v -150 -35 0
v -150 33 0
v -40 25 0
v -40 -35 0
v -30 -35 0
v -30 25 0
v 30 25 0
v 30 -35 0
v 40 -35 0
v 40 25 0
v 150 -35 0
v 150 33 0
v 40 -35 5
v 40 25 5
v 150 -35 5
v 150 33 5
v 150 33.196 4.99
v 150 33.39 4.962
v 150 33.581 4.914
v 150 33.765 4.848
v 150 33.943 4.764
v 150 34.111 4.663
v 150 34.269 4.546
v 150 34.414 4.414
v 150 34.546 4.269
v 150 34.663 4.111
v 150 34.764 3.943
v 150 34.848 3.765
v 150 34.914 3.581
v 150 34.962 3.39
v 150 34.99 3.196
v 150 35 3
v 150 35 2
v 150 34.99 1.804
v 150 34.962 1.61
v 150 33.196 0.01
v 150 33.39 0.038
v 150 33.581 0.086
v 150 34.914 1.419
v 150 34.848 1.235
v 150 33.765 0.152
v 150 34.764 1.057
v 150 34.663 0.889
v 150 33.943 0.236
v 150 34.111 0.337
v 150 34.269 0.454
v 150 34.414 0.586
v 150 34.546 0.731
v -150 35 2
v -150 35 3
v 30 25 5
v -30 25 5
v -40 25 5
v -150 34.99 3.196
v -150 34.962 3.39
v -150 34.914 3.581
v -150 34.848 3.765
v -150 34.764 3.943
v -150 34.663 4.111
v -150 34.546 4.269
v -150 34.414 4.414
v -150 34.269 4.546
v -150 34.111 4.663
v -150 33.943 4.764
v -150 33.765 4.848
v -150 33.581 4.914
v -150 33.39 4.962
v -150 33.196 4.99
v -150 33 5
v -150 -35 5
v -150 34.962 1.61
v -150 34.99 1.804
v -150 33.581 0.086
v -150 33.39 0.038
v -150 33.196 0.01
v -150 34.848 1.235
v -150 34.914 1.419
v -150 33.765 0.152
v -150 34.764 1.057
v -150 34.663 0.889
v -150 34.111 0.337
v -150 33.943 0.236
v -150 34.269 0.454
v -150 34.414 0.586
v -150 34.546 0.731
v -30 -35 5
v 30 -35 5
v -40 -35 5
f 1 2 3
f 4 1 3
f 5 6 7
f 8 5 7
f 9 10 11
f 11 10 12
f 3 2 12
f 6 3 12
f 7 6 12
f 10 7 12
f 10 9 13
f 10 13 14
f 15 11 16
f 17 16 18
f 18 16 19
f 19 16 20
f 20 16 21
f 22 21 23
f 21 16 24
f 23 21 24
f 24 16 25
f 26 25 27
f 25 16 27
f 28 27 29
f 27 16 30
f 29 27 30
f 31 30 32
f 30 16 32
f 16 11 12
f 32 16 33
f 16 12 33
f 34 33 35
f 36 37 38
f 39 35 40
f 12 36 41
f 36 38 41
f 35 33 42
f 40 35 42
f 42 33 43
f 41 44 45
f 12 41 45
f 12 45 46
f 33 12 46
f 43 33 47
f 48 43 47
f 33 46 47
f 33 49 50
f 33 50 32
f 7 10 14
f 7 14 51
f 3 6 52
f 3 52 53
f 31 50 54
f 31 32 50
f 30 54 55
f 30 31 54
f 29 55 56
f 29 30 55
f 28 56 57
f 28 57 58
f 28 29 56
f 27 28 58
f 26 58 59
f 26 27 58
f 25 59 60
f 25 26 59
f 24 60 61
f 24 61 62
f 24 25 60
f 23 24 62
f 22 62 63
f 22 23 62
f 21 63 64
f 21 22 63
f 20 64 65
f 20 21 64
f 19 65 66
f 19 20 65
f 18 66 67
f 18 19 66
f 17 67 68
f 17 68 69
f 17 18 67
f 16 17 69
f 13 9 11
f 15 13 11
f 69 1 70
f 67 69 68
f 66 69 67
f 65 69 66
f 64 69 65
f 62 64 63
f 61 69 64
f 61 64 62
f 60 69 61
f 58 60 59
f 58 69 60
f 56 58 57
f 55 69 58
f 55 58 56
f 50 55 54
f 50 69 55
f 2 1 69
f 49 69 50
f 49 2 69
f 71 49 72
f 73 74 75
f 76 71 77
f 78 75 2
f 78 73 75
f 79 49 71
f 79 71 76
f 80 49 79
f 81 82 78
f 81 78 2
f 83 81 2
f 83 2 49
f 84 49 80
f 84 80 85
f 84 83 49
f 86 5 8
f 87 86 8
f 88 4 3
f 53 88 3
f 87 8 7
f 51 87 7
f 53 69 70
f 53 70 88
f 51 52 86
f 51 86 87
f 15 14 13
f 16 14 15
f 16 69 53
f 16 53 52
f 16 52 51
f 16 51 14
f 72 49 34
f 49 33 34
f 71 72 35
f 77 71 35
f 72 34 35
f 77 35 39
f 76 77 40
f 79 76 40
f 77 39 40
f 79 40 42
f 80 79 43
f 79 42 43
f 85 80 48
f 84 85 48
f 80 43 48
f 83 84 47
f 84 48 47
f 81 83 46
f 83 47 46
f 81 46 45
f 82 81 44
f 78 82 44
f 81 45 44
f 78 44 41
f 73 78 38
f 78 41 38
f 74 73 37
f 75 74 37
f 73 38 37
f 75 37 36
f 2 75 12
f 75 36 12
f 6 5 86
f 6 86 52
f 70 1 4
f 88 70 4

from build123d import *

# Parameters (mm, degrees)
ESQUISSE1_W             = 300
ESQUISSE1_H             = 70
BOSS_EXTRU_1_DEPTH      = 5
CONG_2_R                = 2
CONG_3_R                = 2
ESQUISSE2_W             = 10
ESQUISSE2_H             = 60
ENL_V_MAT_EXTRU_1_DEPTH = 155.110350074


with BuildPart() as part:
    # Esquisse1 → Boss.-Extru.1 (new body)
    with BuildSketch(Plane.XY):
        Rectangle(ESQUISSE1_W, ESQUISSE1_H)
    extrude(amount=BOSS_EXTRU_1_DEPTH)

    # Congé2
    cong_2_edges = [part.edges().sort_by_distance(p)[0] for p in [
        (0, 35, 0),
    ]]
    fillet(cong_2_edges, radius=CONG_2_R)

    # Congé3
    cong_3_edges = [part.edges().sort_by_distance(p)[0] for p in [
        (0, 35, 5),
    ]]
    fillet(cong_3_edges, radius=CONG_3_R)

    # Esquisse2 → Enlèv. mat.-Extru.1 (cut, through all)
    with BuildSketch(Plane(origin=(0, 0, 0), x_dir=(-1, 0, 0), z_dir=(0, 0, -1))):
        with Locations((-35, -5)):
            Rectangle(ESQUISSE2_W, ESQUISSE2_H)
        with Locations((35, -5)):
            Rectangle(ESQUISSE2_W, ESQUISSE2_H)
    extrude(amount=-ENL_V_MAT_EXTRU_1_DEPTH, mode=Mode.SUBTRACT)


solid = part.part
